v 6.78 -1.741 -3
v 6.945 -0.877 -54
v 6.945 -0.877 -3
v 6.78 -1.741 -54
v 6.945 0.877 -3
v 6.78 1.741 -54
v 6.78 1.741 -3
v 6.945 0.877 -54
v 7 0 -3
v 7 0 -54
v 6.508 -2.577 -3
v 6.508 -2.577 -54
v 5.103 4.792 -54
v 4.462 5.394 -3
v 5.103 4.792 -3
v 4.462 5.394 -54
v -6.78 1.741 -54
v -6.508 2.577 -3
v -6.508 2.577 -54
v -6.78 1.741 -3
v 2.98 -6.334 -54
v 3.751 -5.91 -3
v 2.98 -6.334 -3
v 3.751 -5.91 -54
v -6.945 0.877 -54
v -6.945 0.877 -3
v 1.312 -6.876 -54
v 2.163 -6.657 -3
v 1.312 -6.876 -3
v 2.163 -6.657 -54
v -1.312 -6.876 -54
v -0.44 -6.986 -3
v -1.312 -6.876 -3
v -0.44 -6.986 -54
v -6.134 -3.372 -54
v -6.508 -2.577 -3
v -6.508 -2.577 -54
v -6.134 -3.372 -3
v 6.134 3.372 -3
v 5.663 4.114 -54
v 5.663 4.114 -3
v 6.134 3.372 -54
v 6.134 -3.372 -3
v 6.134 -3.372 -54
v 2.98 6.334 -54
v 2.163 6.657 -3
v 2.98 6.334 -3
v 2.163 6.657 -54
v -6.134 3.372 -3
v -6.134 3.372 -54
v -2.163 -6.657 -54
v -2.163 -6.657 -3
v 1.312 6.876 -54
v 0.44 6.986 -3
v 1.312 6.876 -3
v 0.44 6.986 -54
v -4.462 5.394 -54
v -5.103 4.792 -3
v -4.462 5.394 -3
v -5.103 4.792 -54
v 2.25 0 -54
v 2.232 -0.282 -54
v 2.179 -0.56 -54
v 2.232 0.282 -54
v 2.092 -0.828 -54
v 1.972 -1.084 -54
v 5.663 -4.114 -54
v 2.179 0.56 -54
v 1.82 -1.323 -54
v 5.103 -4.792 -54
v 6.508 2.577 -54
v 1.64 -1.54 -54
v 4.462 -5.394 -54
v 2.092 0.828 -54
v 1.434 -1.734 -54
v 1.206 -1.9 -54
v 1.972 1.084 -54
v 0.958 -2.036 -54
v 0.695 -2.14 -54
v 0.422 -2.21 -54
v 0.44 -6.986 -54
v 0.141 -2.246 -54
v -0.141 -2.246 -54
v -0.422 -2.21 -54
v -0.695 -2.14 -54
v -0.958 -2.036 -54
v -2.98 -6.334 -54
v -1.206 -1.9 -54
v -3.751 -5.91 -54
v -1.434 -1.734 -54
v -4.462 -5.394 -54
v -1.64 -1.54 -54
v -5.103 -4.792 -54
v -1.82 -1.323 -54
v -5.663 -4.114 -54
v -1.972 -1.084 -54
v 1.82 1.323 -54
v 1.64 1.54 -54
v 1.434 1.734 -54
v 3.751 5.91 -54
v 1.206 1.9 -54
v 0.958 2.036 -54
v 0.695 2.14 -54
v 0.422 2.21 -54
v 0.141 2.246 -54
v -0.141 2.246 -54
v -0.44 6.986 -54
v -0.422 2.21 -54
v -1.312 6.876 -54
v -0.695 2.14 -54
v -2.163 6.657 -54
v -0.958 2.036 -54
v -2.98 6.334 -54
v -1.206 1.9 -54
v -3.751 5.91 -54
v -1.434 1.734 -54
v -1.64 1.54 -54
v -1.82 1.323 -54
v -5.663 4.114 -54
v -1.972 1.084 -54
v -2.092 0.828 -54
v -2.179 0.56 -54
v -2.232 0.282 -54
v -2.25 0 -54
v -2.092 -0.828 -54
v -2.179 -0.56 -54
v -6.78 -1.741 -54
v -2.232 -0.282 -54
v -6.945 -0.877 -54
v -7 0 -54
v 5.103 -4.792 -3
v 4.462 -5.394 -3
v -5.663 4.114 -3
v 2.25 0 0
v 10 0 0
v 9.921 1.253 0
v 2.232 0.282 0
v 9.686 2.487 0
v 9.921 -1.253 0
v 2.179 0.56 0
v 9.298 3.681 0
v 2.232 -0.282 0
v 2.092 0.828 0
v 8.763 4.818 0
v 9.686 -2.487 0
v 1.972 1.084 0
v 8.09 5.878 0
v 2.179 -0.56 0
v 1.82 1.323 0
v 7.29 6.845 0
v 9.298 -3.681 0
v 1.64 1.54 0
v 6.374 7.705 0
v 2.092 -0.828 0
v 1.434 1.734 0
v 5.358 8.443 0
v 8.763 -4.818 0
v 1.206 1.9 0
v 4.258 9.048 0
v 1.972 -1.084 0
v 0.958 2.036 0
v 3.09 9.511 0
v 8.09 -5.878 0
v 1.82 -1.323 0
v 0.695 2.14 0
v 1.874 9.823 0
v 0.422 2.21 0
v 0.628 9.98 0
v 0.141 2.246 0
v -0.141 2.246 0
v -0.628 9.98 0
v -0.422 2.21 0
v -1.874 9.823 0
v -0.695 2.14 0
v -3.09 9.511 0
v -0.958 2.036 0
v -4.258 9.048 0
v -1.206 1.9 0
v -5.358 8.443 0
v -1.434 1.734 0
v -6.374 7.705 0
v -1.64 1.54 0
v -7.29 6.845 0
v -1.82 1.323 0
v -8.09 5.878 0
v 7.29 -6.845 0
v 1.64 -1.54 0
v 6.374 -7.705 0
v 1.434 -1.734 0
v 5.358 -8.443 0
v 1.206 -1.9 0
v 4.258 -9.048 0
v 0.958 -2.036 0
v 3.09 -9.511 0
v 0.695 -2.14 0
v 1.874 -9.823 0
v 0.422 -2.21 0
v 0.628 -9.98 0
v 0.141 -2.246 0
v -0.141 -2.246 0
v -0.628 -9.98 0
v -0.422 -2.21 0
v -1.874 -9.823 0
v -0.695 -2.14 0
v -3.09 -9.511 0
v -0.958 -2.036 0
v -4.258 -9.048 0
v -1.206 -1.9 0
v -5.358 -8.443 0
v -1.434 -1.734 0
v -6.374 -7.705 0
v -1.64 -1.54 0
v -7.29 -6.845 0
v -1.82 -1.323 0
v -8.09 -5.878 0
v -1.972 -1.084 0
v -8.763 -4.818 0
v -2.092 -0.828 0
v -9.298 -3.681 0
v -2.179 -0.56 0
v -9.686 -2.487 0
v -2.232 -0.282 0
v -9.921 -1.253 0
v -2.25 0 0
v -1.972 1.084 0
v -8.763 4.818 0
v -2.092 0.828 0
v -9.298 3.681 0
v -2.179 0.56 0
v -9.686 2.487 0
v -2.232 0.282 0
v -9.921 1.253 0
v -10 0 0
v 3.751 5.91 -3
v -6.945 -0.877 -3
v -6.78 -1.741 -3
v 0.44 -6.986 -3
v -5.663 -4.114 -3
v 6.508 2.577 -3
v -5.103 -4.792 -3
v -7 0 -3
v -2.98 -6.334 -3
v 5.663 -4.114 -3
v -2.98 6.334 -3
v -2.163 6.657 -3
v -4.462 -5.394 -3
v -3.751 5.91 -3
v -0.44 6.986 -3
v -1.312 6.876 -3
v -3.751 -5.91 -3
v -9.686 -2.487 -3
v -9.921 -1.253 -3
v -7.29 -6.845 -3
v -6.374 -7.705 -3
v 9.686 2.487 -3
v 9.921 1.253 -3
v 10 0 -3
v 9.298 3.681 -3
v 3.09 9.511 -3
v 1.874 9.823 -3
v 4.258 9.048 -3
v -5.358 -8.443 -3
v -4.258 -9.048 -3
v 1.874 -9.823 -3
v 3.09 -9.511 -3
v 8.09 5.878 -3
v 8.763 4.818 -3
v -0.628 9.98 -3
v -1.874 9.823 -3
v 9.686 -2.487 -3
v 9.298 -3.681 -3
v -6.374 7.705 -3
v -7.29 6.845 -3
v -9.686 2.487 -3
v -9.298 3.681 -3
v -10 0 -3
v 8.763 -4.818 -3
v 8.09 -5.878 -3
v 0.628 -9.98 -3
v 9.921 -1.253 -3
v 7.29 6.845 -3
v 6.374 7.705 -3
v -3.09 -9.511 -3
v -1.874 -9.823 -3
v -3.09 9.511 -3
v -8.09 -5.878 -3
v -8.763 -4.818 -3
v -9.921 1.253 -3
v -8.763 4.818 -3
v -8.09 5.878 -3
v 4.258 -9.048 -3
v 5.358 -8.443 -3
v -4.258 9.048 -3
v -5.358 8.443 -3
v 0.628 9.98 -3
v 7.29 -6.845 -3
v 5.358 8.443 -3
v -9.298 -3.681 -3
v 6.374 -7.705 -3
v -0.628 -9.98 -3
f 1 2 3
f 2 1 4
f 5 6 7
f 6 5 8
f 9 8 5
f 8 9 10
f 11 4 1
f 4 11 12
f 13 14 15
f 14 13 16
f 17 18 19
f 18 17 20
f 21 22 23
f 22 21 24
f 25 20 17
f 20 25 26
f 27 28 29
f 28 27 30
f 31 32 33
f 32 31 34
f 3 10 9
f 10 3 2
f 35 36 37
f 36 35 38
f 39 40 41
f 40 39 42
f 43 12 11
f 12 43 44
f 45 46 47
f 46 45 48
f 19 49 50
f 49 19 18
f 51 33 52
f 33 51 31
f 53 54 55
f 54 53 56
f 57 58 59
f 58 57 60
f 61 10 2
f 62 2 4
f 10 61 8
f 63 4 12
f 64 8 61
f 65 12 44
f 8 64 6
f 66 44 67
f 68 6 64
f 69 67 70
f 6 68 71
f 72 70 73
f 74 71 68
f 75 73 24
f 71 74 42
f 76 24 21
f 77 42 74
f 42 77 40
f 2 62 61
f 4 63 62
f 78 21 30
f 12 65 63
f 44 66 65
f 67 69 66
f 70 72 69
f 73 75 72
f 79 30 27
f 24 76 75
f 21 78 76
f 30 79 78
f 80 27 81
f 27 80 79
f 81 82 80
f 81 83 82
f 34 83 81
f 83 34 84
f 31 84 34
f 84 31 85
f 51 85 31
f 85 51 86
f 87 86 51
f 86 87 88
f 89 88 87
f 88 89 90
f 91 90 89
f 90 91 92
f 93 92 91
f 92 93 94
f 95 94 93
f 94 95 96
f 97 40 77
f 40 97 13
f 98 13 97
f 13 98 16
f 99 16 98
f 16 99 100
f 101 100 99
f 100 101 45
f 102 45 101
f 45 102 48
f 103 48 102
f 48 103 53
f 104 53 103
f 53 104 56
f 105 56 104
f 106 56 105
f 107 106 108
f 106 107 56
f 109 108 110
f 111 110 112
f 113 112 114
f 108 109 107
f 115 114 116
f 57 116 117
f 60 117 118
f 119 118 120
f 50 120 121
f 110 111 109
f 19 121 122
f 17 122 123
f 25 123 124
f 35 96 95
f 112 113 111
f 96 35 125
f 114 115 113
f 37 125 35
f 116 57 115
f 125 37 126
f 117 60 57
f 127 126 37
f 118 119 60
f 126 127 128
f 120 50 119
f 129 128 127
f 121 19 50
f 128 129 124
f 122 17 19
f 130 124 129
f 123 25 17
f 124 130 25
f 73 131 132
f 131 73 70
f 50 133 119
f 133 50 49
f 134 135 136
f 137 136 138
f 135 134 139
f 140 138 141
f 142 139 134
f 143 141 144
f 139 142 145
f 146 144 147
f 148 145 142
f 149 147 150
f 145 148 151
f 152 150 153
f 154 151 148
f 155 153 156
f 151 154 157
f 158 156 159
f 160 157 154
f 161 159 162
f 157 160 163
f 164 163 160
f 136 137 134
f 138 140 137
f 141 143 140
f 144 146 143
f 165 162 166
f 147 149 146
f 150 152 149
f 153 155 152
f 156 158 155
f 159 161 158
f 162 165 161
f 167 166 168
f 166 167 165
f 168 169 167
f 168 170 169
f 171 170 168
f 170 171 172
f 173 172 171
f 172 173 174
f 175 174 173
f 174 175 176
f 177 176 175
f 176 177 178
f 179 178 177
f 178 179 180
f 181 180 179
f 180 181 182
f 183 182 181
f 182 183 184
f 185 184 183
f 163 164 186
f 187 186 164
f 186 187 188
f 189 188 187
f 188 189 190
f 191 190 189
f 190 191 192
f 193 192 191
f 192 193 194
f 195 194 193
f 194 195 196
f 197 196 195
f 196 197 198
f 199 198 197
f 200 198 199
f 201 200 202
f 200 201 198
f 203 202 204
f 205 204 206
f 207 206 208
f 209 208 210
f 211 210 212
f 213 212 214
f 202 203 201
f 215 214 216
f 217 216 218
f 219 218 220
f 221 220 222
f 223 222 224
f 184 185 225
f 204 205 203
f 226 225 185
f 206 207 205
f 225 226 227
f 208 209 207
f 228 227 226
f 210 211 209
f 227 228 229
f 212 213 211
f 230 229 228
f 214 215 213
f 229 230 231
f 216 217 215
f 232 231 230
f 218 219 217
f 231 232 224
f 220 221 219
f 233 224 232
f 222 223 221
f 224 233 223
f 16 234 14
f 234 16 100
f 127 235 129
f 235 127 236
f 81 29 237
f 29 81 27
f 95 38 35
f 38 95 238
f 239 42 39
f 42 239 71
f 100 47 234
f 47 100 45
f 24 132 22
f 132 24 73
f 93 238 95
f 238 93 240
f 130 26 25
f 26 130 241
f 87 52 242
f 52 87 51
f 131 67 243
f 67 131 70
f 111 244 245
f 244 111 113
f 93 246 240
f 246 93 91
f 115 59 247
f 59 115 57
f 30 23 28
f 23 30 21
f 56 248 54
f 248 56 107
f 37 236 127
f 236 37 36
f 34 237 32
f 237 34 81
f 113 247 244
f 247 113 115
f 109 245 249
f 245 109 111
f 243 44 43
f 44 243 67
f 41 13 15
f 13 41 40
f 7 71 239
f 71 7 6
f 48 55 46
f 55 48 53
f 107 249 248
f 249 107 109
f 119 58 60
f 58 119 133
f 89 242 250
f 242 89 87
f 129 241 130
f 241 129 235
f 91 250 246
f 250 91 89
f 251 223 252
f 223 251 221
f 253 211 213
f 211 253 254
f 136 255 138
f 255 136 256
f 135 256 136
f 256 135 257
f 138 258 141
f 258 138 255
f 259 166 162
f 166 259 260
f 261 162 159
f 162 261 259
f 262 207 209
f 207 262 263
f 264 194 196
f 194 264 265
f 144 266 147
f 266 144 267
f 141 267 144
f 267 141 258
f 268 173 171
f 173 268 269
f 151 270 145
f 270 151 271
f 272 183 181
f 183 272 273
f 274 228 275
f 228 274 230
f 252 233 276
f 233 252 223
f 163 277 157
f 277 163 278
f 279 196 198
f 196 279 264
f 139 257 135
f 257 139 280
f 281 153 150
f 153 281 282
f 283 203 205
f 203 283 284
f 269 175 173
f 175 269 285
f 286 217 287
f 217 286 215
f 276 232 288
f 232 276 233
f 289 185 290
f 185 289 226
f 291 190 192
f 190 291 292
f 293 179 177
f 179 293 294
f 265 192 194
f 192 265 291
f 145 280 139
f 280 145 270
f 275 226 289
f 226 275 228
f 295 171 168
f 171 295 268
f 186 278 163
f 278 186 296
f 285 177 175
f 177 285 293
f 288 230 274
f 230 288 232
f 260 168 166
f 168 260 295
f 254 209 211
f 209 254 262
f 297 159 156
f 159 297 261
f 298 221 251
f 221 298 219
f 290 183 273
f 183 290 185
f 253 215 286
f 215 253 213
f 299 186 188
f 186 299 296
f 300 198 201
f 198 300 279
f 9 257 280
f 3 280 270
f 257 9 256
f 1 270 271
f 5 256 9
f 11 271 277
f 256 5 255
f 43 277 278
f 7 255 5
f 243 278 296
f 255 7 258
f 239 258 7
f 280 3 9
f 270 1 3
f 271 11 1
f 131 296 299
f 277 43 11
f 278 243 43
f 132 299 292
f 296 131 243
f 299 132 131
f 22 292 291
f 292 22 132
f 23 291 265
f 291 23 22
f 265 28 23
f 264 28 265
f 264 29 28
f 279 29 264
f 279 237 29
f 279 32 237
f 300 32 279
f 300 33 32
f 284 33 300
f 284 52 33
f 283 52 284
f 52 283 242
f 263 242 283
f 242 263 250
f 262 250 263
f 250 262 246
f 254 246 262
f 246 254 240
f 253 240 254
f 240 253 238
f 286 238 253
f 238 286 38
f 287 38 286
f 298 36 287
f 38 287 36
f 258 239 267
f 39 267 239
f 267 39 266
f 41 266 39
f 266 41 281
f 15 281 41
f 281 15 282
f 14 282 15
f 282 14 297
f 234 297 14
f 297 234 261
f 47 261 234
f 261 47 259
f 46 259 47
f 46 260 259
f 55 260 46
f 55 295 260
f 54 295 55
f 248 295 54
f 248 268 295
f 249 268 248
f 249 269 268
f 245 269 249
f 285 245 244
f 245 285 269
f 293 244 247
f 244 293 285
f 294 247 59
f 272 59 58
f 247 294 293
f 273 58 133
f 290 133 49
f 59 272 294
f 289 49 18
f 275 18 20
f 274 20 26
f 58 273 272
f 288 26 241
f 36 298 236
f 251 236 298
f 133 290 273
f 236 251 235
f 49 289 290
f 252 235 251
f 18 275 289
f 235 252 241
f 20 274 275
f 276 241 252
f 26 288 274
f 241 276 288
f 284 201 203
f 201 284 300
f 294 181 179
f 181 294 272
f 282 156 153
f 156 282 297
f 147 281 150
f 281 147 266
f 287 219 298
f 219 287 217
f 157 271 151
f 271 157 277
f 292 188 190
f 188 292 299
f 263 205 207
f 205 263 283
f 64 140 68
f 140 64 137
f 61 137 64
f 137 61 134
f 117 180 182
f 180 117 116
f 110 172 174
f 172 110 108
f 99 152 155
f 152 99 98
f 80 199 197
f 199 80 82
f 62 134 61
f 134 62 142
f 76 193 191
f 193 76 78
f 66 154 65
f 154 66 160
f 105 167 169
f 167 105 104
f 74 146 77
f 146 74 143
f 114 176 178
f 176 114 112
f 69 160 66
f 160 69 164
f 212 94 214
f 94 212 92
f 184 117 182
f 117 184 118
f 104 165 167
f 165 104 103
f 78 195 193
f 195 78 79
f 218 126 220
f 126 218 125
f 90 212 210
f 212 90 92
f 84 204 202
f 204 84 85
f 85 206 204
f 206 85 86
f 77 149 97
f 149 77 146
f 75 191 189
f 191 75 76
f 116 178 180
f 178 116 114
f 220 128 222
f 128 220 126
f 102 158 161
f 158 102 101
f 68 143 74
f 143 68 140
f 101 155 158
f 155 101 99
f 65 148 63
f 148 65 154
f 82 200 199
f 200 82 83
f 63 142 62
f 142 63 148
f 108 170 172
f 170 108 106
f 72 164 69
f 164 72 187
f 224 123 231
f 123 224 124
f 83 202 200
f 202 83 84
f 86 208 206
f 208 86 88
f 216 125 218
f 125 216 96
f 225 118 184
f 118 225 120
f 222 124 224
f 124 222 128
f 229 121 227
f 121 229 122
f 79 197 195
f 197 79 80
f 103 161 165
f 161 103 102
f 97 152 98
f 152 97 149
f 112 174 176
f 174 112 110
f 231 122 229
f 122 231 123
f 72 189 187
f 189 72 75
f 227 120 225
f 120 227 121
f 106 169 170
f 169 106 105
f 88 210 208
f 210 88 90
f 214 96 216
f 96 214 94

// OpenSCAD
$fn = 50;


difference() {
	union() {
		translate(v = [0, 0, -54.0000000000]) {
			cylinder(h = 54, r = 7.0000000000);
		}
		translate(v = [0, 0, -3.0000000000]) {
			cylinder(h = 3, r = 10.0000000000);
		}
	}
	union() {
		#translate(v = [0, 0, -54]) {
			cylinder(h = 54, r = 2.2500000000);
		}
	}
}
